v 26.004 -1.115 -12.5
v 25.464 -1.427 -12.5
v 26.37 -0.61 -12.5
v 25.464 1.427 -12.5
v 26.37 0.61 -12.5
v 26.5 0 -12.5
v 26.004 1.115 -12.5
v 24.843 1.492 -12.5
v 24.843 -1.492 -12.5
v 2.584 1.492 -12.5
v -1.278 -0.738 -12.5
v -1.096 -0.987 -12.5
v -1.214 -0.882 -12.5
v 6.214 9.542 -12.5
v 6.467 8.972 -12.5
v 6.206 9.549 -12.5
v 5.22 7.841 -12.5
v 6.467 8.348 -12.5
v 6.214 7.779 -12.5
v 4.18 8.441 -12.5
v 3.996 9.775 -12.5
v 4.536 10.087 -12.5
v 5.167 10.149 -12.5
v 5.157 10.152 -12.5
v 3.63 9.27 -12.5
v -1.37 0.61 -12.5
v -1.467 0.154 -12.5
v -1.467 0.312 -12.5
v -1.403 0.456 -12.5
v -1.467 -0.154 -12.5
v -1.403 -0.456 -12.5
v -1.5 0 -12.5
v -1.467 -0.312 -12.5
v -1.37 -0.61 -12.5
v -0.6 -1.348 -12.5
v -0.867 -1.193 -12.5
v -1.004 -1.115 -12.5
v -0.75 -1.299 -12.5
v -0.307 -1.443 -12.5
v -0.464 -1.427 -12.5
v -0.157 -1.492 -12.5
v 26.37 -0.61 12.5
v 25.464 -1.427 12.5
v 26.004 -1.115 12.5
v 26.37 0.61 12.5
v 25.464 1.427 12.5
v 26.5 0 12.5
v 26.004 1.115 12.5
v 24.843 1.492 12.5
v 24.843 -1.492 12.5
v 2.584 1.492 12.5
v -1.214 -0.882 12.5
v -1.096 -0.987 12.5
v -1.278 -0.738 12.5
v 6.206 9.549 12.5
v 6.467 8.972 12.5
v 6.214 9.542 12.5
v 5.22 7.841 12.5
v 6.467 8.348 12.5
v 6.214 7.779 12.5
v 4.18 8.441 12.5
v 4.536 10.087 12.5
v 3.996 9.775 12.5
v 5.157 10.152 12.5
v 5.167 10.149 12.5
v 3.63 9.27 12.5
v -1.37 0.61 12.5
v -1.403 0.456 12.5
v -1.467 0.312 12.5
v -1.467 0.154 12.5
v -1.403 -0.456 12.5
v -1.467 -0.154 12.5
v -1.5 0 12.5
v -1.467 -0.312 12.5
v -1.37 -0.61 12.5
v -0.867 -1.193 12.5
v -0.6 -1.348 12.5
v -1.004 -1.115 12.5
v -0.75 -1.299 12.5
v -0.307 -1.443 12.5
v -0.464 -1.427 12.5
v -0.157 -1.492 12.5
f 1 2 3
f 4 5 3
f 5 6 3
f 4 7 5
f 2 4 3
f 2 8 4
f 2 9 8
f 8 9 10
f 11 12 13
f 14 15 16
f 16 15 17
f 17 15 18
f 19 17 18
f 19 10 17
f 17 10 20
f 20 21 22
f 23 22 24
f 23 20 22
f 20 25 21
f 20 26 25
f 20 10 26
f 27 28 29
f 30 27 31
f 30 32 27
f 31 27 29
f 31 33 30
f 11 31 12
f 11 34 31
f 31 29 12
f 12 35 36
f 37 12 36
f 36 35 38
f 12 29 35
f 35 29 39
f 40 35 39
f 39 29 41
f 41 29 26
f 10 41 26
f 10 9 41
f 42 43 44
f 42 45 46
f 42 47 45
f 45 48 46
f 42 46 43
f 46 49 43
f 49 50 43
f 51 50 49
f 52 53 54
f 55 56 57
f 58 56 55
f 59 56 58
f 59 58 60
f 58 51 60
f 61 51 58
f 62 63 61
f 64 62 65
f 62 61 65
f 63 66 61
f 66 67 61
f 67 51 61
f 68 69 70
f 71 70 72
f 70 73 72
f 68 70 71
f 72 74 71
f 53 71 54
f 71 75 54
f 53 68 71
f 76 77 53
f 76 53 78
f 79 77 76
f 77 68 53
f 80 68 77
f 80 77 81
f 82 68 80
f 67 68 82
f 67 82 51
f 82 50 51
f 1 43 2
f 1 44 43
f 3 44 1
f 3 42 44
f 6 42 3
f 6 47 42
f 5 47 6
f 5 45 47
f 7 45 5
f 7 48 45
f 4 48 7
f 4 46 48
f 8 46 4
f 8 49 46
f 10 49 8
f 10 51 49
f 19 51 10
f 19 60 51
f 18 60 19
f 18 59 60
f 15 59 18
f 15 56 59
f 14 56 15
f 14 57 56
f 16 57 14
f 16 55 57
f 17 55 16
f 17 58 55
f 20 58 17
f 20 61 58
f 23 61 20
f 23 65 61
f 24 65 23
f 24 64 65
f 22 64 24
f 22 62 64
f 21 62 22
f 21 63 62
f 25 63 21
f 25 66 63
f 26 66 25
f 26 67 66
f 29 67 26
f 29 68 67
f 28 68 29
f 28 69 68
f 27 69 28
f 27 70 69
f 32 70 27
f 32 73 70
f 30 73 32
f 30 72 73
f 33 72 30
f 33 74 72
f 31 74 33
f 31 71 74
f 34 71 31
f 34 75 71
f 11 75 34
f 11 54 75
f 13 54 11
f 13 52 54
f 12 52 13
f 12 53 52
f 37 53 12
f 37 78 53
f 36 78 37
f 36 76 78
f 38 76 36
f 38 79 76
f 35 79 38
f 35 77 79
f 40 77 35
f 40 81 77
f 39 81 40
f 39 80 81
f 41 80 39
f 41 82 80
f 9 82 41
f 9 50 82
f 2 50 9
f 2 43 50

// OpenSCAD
flat_text_base_hight = 1.2;
flat_text_holder_thickness = 3;
flat_text_holder_width = 25;
flat_text_holder_angle = 60;
flat_text_holder_base_depth = 25;

module __flat_text_hoilder_base()
{
    hull() {
        translate([flat_text_holder_base_depth, 0, 0]) circle(d = flat_text_holder_thickness, $fn = 15);
        circle(d = flat_text_holder_thickness, $fn = 15);
    }
}

module __flat_text_hoilder() {
    rotate(flat_text_holder_angle) {
        difference() {
            hull() {
                translate([10, 0, 0]) circle(d = flat_text_holder_thickness, $fn = 15);
                circle(d = flat_text_holder_thickness, $fn = 15);
            }
            hull() {
                translate([10, 0, 0]) square(flat_text_base_hight, center = true);
                translate([1000, 0, 0]) circle(d = flat_text_base_hight);
            }
        }
    }
}

module flat_text_holder()
{
    linear_extrude(height = flat_text_holder_width, center = true, convexity = 10, twist = 0) {
        __flat_text_hoilder();
        __flat_text_hoilder_base();
    }
}

flat_text_holder();
